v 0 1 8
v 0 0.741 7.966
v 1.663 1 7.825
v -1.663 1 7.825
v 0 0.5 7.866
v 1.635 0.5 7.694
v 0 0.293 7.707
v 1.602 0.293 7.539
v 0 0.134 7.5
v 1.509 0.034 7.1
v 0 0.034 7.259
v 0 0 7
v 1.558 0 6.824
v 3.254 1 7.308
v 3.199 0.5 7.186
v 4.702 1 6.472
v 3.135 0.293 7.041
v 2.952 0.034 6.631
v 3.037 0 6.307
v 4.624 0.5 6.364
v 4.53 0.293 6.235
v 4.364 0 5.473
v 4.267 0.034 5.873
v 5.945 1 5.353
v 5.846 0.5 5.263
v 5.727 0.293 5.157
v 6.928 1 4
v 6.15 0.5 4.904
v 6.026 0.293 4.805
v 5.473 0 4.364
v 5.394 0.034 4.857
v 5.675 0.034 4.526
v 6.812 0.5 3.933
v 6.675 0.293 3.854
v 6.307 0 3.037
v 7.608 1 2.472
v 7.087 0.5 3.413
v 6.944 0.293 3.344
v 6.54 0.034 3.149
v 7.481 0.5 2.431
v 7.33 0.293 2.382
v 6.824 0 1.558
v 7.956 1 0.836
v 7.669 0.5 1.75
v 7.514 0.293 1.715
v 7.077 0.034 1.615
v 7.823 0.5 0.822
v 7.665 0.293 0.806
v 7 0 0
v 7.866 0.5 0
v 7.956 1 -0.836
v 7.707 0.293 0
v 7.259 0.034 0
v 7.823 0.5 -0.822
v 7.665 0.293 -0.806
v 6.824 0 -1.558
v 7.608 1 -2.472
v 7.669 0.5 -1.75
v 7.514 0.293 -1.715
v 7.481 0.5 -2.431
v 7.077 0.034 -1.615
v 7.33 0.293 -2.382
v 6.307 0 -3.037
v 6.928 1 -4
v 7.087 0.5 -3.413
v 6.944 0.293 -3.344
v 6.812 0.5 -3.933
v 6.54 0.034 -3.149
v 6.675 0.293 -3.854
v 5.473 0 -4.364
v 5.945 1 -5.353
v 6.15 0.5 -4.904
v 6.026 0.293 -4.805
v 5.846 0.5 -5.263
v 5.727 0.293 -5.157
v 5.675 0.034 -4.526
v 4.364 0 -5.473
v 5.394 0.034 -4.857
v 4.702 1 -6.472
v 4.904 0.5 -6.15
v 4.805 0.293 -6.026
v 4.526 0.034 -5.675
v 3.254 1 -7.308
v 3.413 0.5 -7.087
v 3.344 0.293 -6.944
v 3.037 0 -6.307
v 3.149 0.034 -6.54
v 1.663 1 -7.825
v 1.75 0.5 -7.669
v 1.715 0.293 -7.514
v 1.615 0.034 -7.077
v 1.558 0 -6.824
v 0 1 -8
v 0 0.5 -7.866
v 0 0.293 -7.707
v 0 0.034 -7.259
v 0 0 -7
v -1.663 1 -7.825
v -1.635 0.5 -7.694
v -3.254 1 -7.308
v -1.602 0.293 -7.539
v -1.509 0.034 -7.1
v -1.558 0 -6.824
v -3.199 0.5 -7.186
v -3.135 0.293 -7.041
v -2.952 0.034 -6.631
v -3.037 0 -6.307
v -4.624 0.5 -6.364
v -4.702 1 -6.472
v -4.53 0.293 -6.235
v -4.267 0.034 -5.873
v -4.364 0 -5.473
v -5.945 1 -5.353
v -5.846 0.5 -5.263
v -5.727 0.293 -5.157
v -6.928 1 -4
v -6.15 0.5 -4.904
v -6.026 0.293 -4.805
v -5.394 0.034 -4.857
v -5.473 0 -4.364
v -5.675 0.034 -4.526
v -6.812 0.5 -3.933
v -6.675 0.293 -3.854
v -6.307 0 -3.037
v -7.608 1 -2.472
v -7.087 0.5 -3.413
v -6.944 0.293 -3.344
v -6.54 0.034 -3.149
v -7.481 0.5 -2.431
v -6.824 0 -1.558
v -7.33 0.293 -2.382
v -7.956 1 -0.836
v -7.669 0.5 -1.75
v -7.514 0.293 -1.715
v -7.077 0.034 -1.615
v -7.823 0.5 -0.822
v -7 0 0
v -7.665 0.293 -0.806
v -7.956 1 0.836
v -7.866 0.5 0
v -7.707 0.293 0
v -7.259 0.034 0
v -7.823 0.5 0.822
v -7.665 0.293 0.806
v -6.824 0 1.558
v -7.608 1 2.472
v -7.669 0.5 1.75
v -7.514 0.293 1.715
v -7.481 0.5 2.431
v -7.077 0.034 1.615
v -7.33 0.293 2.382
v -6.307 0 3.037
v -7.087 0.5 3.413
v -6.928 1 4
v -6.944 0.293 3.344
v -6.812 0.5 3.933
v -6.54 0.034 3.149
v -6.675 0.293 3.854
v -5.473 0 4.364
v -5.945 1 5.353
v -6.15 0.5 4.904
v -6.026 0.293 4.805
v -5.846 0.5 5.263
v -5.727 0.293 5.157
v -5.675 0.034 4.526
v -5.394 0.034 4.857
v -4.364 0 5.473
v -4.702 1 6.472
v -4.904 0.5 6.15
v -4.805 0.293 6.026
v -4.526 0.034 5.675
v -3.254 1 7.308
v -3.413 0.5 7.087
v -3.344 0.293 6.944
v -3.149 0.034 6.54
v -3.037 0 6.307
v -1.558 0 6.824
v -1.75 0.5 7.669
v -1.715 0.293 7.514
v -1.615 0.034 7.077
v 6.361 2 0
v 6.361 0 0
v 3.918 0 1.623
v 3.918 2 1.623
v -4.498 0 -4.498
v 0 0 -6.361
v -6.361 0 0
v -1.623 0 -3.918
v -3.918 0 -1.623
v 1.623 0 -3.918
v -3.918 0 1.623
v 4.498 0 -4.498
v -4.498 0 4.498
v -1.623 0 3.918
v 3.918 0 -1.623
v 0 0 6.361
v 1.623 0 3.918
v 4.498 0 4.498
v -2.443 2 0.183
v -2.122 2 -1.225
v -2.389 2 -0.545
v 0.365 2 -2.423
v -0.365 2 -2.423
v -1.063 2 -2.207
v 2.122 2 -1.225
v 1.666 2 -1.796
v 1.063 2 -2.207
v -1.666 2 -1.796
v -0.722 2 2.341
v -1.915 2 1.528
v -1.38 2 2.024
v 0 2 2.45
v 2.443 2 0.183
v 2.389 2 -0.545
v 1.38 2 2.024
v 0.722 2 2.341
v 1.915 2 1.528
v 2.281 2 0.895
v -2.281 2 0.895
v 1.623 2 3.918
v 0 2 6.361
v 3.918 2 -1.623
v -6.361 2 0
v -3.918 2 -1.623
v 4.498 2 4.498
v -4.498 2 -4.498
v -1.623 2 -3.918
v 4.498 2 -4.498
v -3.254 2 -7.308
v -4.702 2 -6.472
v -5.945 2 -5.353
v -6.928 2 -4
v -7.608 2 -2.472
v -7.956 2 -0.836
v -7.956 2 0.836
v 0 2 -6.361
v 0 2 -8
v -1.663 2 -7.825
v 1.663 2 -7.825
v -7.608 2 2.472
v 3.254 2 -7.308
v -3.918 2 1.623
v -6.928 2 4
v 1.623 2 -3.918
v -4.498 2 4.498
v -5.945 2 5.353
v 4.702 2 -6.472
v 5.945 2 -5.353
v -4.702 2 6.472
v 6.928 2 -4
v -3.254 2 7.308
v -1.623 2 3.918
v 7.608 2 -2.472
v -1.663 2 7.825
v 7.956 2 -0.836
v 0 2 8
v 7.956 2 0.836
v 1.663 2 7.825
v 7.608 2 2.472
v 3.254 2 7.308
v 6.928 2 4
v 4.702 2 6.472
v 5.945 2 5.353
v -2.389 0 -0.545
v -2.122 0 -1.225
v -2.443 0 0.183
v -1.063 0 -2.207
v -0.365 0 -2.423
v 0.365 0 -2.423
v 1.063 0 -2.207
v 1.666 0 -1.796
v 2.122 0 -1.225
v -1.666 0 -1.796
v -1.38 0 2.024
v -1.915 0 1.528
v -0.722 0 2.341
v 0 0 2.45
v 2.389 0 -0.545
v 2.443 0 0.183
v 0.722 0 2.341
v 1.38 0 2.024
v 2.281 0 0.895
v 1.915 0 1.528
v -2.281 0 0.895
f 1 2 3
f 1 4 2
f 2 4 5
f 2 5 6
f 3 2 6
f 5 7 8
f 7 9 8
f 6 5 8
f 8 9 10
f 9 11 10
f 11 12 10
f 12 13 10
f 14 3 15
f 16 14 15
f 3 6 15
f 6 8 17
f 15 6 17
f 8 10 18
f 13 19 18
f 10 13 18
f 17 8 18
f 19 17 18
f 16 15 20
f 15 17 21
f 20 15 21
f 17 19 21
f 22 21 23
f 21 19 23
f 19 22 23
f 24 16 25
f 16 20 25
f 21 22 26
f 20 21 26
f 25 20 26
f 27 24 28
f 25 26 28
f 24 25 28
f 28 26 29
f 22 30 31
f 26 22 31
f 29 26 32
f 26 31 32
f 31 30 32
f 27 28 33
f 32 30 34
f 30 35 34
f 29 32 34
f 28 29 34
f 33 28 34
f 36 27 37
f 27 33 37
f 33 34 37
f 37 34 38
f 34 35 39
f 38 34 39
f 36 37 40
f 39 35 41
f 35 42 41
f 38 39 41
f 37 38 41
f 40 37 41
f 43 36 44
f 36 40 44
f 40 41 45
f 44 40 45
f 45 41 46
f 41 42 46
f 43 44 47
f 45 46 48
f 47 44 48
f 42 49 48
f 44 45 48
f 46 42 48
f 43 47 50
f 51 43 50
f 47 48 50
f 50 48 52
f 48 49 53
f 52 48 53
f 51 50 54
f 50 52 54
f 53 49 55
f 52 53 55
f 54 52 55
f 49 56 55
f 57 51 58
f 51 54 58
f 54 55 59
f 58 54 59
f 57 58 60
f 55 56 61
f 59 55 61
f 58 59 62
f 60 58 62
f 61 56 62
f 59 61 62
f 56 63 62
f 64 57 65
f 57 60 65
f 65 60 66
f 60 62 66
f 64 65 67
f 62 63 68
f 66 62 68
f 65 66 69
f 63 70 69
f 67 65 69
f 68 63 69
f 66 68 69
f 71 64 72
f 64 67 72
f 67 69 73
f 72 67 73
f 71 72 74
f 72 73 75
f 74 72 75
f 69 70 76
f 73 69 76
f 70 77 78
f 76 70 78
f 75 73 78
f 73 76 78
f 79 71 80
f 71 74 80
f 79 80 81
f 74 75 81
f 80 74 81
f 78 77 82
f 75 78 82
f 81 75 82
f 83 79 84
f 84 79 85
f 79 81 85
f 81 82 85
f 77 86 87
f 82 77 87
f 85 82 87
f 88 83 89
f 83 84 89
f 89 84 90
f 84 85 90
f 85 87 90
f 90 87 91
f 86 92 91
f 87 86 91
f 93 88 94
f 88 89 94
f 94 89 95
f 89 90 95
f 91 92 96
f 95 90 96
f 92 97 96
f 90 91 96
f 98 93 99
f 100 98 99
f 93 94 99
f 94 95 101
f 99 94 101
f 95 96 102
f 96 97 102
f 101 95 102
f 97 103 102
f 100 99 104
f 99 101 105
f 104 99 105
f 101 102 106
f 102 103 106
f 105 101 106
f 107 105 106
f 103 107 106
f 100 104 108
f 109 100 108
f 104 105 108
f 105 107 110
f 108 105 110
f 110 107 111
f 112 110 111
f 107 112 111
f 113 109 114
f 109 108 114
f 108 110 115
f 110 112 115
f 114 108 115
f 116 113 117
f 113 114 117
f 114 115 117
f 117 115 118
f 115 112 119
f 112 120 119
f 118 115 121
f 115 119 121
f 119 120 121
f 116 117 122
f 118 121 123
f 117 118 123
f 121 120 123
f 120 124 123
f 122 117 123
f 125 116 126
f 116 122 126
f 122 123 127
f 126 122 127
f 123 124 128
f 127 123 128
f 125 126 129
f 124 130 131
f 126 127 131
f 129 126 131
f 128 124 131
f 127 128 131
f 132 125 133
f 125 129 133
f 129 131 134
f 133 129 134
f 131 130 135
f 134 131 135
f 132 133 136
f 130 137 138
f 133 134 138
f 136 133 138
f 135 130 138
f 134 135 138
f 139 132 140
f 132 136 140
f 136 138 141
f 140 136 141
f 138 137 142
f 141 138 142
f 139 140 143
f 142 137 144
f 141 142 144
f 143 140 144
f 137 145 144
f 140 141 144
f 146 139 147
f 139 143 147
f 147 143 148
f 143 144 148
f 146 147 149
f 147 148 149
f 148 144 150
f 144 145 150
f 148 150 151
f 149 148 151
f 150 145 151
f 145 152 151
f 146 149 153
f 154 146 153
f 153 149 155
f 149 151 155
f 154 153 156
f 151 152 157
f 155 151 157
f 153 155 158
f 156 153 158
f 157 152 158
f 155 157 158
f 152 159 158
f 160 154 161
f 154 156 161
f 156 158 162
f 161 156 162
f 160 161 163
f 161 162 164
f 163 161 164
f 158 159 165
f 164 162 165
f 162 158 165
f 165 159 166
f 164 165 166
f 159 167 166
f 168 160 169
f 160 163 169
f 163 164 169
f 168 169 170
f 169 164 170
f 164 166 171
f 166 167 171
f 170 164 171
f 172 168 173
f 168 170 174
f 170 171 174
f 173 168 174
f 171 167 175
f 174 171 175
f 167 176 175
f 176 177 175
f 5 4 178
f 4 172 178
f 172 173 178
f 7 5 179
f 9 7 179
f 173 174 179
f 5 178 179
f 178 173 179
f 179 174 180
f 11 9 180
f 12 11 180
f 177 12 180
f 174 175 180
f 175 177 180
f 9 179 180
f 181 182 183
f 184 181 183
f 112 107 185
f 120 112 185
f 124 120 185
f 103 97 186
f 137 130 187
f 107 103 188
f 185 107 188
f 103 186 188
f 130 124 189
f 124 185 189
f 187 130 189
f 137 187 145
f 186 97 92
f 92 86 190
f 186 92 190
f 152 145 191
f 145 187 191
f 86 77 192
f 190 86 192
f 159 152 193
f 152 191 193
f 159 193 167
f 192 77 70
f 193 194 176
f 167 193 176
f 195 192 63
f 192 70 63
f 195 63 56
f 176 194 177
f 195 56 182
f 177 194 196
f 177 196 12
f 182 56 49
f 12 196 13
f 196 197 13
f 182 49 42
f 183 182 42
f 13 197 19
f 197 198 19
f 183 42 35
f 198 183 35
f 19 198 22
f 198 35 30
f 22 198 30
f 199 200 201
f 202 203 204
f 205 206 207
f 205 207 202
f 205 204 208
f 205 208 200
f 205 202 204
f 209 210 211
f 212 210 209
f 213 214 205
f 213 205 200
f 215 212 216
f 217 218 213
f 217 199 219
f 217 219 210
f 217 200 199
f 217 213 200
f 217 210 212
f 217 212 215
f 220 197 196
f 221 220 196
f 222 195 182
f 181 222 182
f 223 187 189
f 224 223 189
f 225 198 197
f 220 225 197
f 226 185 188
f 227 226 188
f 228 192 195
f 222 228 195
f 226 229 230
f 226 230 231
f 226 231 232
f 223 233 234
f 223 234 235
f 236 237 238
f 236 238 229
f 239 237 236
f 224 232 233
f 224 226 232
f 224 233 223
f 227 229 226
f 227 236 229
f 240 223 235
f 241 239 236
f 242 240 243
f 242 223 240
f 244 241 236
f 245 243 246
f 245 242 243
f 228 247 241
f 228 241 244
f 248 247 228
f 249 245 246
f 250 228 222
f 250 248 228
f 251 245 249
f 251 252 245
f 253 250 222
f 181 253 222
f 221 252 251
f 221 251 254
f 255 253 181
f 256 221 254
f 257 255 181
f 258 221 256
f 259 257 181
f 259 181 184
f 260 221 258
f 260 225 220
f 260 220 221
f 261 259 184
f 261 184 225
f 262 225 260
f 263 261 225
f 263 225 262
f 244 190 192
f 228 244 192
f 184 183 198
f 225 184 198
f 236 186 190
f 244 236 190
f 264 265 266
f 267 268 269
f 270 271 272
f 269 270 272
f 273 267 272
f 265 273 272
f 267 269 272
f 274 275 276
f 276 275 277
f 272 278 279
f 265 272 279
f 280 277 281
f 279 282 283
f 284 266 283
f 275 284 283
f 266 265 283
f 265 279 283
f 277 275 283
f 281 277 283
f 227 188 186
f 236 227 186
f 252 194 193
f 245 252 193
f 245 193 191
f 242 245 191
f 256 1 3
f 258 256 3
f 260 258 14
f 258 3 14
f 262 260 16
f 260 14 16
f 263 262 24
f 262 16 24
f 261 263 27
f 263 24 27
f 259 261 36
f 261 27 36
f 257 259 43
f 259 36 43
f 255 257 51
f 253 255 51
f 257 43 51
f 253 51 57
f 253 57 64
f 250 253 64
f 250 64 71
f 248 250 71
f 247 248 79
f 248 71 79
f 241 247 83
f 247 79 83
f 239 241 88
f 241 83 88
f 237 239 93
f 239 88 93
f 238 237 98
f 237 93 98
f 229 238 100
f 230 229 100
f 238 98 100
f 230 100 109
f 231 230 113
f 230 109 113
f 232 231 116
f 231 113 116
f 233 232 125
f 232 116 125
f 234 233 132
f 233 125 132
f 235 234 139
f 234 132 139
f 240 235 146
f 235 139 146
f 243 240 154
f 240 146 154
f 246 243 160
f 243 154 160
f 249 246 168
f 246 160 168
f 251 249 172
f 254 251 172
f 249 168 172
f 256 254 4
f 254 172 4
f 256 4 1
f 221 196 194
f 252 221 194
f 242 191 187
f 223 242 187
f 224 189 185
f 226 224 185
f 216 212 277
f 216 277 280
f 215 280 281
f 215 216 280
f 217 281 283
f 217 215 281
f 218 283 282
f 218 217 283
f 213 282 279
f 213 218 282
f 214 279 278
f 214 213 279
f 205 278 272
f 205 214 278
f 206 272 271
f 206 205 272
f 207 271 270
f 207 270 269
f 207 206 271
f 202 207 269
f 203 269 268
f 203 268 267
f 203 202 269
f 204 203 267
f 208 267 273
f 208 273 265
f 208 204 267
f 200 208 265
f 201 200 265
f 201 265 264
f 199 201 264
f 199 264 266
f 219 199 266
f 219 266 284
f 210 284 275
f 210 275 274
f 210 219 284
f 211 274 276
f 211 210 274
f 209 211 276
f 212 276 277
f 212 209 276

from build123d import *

# Parameters (mm, degrees)
SKETCH1_R           = 8
BOSS_EXTRUDE1_DEPTH = 2
FILLET1_R           = 1
SKETCH2_R           = 2.45
BOSS_EXTRUDE2_DEPTH = 2


with BuildPart() as part:
    # Sketch1 → Boss-Extrude1 (new body)
    with BuildSketch(Plane(origin=(0, 0, 0), x_dir=(1, 0, 0), z_dir=(0, 1, 0))):
        with Locations(Location((0, 0, 0), (0, 0, 270))):
            Circle(SKETCH1_R)
        Polygon((-3.918152642, 1.622951964), (-4.498236304, 4.498236304), (-1.622951964, 3.918152642), (0, 6.361466788), (1.622951964, 3.918152642), (4.498236304, 4.498236304), (3.918152642, 1.622951964), (6.361466788, 0), (3.918152642, -1.622951964), (4.498236304, -4.498236304), (1.622951964, -3.918152642), (0, -6.361466788), (-1.622951964, -3.918152642), (-4.498236304, -4.498236304), (-3.918152642, -1.622951964), (-6.361466788, 0), align=None, mode=Mode.SUBTRACT)
    extrude(amount=BOSS_EXTRUDE1_DEPTH)

    # Fillet1
    fillet1_edges = [part.edges().sort_by_distance(p)[0] for p in [
        (0, 0, -8),
    ]]
    fillet(fillet1_edges, radius=FILLET1_R)


with BuildPart() as body_2:
    # Sketch2 → Boss-Extrude2 (new body)
    with BuildSketch(Plane(origin=(0, 2, 0), x_dir=(1, 0, 0), z_dir=(0, 1, 0))):
        with Locations(Location((0, 0, 0), (0, 0, 270))):
            Circle(SKETCH2_R)
    extrude(amount=-BOSS_EXTRUDE2_DEPTH)


solid = Compound([part.part, body_2.part])
